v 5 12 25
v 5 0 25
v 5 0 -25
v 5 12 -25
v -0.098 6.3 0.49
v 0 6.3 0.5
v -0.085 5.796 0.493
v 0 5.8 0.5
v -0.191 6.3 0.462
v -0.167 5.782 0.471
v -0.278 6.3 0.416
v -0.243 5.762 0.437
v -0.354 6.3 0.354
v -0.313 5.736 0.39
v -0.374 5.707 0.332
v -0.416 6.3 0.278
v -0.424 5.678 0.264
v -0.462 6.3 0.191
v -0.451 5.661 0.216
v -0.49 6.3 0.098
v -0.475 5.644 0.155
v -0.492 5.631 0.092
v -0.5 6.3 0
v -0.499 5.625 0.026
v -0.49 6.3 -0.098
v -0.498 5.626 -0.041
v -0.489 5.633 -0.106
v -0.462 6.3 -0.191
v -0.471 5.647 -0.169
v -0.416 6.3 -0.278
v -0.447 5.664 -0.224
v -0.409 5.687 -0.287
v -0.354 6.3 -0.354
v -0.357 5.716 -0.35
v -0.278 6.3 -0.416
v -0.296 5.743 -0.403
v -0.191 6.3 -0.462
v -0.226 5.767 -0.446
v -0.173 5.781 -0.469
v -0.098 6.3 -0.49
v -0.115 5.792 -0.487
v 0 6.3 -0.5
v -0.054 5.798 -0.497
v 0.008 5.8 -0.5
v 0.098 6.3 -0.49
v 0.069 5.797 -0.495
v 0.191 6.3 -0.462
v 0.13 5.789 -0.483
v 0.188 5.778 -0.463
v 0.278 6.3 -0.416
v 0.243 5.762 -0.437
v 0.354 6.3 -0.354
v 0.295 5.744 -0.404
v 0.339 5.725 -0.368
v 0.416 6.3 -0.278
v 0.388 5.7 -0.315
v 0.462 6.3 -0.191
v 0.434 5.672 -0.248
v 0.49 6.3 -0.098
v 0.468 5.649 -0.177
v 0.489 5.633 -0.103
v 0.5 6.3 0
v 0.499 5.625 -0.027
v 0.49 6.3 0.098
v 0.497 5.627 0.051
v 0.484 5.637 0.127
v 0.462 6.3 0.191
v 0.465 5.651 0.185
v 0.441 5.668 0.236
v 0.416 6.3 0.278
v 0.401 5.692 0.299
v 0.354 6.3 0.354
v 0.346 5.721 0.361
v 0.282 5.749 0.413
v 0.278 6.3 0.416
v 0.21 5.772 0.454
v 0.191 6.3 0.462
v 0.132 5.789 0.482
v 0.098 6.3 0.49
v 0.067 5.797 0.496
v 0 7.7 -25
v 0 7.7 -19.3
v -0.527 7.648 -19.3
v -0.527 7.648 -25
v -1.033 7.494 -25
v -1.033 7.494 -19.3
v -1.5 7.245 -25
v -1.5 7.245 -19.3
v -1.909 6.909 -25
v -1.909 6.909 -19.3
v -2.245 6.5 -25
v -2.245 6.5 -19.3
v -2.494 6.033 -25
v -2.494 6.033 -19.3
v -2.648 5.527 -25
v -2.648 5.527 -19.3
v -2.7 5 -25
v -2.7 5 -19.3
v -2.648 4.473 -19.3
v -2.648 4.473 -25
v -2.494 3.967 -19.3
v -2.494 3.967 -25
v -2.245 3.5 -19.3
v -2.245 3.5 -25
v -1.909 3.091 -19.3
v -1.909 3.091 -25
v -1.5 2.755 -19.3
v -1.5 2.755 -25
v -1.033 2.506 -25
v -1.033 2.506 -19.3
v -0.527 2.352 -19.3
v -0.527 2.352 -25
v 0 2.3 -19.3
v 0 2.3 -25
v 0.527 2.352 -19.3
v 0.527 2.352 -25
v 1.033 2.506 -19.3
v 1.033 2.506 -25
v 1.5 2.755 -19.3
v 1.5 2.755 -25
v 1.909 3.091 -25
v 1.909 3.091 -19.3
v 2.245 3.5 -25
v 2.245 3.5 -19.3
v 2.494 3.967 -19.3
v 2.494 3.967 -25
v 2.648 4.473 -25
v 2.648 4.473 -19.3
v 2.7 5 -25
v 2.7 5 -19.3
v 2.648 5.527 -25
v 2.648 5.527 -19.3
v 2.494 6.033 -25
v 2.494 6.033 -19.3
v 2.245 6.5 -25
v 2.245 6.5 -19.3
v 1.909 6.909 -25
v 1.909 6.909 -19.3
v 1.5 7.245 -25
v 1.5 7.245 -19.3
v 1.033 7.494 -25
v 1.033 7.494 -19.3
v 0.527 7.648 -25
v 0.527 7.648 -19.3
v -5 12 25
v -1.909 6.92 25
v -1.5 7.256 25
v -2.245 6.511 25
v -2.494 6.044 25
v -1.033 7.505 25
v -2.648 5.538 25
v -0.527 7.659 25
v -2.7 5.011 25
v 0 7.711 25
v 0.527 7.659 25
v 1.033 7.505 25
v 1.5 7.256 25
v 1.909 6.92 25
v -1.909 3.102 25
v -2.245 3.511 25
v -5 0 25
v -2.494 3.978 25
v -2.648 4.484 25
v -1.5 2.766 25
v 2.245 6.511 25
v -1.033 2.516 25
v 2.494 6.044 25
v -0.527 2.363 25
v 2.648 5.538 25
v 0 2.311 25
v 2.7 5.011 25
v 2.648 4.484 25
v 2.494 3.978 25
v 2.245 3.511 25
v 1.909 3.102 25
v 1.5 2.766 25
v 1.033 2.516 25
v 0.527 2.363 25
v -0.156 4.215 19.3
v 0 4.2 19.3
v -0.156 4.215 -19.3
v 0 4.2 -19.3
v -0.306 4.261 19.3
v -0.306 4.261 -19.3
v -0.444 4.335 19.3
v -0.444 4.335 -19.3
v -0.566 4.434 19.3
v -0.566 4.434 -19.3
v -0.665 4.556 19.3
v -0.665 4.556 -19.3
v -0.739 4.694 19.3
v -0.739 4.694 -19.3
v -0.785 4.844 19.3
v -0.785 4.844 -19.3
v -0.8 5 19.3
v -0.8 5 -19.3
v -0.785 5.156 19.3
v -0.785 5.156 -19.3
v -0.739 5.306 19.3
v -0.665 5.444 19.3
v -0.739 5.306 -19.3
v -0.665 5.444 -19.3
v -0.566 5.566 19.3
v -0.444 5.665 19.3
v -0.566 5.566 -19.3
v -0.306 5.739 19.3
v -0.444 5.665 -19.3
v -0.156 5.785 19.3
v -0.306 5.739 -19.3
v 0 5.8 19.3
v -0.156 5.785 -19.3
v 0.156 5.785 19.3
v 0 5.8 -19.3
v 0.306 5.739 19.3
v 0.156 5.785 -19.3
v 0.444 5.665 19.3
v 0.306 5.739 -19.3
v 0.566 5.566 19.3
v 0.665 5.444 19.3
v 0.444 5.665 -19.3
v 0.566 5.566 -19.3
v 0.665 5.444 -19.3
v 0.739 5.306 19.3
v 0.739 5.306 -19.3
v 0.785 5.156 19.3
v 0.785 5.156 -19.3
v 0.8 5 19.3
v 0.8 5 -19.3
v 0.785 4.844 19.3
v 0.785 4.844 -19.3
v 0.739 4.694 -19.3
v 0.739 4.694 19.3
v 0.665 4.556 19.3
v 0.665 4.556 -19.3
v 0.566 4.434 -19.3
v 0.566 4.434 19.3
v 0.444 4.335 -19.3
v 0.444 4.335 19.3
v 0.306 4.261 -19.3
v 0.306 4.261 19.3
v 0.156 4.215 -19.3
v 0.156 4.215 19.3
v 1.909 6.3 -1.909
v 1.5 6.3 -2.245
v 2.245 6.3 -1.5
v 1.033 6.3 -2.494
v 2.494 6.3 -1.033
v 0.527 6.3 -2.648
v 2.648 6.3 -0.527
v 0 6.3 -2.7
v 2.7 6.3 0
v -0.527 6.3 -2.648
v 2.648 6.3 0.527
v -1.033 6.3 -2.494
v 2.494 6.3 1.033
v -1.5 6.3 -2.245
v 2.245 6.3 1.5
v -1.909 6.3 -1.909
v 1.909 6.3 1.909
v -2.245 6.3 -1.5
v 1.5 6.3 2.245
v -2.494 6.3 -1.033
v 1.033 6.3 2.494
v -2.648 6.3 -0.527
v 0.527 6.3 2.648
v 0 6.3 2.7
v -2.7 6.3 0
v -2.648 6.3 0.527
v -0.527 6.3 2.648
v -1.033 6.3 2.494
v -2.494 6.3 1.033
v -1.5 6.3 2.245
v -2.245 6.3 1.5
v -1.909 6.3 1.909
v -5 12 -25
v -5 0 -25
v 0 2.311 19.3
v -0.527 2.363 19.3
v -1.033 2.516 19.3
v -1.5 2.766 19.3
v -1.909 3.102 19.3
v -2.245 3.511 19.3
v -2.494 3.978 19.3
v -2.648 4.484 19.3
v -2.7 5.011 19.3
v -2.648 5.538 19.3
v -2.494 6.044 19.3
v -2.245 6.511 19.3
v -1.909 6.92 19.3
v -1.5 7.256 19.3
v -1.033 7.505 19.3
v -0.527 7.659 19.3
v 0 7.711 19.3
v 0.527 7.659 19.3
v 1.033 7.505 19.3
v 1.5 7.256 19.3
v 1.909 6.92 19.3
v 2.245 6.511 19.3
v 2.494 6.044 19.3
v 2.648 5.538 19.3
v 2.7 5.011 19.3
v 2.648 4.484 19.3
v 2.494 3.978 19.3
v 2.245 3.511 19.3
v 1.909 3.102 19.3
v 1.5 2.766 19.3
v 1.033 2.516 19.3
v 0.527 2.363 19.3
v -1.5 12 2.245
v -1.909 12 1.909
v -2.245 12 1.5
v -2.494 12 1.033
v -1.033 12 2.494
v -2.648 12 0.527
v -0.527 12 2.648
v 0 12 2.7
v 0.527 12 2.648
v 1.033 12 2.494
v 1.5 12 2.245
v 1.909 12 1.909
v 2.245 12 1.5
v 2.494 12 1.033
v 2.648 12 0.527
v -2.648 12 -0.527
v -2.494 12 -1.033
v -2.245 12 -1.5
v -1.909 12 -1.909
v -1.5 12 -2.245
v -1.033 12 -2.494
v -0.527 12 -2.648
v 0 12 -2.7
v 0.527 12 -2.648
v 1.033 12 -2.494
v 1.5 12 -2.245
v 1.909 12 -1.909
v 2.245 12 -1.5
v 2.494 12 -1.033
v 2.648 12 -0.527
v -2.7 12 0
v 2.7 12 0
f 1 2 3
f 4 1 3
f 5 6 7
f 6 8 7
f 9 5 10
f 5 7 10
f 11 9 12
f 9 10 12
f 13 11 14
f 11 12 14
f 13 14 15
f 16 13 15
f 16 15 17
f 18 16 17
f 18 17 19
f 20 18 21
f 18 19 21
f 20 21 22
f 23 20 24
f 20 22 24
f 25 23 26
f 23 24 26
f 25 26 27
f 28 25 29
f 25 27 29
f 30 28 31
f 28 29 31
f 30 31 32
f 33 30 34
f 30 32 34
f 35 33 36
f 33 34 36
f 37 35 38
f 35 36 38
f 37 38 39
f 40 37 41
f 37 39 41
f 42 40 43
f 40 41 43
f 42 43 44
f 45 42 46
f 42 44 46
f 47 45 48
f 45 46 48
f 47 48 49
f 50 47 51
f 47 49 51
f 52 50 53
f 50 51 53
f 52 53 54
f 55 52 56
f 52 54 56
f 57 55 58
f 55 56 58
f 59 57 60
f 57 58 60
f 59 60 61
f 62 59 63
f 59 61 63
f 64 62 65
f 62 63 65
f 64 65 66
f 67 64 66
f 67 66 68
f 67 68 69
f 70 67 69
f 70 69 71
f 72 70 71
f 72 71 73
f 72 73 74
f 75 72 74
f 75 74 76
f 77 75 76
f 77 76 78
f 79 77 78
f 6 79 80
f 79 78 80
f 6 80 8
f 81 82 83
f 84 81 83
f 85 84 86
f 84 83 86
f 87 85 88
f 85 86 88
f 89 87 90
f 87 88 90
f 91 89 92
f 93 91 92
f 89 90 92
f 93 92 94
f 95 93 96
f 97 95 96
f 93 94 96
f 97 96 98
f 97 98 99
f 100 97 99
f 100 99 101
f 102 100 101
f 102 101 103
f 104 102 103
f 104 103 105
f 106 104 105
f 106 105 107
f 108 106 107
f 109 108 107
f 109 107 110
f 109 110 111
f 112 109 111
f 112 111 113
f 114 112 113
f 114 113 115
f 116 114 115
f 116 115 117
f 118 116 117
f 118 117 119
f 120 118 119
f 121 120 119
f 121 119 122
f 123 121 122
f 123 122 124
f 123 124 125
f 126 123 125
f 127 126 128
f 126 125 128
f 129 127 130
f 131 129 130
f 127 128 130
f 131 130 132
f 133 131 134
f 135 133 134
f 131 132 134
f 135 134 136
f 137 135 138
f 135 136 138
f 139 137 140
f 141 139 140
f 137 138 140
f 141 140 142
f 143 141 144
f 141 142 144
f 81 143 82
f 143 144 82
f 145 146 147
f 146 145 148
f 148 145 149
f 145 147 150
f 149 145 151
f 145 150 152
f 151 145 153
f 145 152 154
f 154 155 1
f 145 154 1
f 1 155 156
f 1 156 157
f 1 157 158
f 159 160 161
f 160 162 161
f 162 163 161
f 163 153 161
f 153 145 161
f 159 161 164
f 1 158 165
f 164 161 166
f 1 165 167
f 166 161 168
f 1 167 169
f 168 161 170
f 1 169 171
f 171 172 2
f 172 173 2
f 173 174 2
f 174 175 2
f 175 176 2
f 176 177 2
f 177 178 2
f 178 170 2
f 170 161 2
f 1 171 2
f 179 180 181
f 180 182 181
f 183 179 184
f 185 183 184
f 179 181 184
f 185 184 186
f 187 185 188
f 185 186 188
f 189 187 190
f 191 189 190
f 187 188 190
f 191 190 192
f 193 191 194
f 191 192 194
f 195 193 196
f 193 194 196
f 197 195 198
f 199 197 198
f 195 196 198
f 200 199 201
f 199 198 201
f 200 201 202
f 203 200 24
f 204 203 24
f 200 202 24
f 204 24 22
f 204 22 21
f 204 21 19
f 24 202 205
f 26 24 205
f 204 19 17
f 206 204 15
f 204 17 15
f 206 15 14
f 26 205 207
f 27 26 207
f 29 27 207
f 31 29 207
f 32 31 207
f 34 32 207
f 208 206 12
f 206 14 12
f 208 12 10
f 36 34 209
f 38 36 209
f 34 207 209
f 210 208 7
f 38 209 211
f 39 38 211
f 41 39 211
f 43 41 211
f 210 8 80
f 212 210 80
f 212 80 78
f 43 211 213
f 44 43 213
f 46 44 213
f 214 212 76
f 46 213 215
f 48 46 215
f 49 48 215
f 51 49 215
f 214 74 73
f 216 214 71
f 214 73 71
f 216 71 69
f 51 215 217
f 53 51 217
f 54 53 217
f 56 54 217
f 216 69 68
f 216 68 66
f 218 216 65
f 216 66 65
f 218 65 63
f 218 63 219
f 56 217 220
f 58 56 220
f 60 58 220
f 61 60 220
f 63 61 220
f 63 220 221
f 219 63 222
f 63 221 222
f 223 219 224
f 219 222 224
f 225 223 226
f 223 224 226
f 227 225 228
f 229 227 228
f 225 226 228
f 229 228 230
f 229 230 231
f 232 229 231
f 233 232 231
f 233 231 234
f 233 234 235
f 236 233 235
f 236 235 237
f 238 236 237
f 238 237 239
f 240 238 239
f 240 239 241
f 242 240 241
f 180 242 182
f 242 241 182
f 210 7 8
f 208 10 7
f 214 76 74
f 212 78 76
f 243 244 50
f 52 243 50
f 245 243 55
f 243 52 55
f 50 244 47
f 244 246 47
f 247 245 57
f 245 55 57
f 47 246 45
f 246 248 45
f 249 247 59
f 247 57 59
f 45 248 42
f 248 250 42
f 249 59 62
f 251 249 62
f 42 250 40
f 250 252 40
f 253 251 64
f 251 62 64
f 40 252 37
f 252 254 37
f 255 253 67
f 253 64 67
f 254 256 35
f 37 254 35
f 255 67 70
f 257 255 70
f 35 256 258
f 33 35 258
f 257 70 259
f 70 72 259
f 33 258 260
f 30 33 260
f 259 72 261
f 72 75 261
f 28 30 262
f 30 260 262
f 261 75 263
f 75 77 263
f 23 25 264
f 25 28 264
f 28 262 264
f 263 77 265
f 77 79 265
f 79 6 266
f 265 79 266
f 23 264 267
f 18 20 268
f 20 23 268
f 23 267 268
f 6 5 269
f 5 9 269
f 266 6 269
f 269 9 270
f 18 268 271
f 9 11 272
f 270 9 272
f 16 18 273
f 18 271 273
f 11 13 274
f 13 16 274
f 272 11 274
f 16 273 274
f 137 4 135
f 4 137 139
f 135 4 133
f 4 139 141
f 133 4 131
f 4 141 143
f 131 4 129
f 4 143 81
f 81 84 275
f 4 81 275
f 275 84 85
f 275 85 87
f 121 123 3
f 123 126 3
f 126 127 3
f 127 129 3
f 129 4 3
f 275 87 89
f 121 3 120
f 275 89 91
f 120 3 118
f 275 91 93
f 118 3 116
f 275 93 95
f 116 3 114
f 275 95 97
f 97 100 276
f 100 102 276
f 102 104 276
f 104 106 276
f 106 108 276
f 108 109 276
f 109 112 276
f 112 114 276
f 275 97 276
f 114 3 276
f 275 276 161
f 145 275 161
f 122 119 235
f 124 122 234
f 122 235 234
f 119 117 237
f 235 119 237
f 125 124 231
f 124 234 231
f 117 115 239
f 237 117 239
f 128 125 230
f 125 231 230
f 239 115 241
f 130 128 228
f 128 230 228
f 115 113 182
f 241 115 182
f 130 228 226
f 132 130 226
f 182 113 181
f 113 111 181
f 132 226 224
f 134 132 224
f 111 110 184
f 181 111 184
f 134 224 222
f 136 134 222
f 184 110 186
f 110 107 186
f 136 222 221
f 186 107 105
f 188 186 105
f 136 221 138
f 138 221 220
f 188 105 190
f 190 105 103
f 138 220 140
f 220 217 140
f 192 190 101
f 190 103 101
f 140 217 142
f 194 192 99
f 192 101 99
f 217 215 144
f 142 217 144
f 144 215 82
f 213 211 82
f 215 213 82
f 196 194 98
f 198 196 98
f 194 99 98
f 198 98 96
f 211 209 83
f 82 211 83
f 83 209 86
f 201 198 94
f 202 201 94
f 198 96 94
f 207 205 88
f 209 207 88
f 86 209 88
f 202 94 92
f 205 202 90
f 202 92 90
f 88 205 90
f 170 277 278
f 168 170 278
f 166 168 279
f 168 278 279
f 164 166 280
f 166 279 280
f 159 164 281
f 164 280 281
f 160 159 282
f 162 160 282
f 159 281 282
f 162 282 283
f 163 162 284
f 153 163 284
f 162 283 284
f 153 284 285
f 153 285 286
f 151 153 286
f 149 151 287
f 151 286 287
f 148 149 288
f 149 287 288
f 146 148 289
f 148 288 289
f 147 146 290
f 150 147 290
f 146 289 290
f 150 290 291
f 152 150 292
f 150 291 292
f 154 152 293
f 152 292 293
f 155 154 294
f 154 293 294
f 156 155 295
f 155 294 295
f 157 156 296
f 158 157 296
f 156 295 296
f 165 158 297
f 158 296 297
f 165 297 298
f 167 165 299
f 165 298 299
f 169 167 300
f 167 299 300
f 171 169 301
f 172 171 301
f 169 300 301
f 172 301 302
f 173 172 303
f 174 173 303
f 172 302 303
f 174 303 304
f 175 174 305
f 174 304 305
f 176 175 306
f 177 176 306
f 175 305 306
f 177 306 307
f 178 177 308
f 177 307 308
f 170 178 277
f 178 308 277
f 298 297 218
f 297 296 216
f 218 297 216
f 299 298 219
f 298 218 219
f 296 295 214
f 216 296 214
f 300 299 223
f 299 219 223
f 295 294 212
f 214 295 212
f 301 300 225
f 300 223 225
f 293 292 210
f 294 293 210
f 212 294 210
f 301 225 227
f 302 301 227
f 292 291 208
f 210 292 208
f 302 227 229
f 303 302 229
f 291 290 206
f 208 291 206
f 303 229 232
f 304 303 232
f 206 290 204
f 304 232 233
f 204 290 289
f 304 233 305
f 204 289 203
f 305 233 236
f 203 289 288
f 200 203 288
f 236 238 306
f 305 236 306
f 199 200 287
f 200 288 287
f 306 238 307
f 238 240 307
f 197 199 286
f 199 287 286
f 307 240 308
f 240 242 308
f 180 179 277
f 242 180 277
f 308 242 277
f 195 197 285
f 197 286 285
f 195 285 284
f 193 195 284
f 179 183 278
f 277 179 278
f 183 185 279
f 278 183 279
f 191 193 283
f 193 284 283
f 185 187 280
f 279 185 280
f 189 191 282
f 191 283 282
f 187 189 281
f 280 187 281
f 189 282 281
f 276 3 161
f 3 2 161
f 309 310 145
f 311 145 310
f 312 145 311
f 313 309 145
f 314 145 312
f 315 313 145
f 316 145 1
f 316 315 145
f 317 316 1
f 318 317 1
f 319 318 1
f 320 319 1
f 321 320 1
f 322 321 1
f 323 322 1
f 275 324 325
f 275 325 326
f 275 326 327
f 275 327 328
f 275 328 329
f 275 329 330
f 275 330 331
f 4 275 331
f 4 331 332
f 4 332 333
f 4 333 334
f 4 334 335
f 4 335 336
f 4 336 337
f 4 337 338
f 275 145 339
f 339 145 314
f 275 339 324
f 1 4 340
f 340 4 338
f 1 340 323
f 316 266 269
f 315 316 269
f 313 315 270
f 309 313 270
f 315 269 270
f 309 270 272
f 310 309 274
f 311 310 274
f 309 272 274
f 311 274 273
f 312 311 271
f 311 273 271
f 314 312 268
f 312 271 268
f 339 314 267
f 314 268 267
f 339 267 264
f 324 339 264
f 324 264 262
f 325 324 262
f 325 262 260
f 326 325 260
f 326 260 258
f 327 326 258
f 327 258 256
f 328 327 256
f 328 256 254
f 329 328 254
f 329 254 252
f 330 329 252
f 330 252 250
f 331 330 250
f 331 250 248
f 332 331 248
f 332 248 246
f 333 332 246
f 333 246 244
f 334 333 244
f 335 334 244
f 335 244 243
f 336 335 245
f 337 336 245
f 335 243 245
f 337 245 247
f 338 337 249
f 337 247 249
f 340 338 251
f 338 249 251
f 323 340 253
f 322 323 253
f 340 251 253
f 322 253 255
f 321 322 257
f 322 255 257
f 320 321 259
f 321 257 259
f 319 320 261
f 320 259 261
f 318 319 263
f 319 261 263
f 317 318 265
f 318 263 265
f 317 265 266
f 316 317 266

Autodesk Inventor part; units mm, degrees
ref_plane "YZ Plane" through (0, 0, 0) normal (1, 0, 0) x (0, 1, 0)
ref_plane "XZ Plane" through (0, 0, 0) normal (0, 1, 0) x (-1, 0, 0)
ref_plane "XY Plane" through (0, 0, 0) normal (0, 0, 1) x (1, 0, 0)
sketch "Skizze1" plane through (0, 0, 0) normal (0, 1, 0) x (-1, 0, 0)
  line L0 (-5, -25) -> (5, -25)
  line L1 (5, -25) -> (5, 25)
  line L2 (5, 25) -> (-5, 25)
  line L3 (-5, 25) -> (-5, -25)
  line L4 (-5, -25) -> (5, 25) construction
  line L5 (5, -25) -> (-5, 25) construction
  point P0 (0, 0)
  dimension "d0" = 10
  dimension "d1" = 50
extrude "Extrusion1" add sketch "Skizze1" along normal blind 10
sketch "Skizze2" plane through (-5, 0, 25) normal (0, 0, 1) x (1, 0, 0)
  circle A0 centre (5, 5) radius 0.8
  point P0 (5, 0)
  dimension "d4" = 1.6
hole "Bohrung1" at (0, 5, 25) direction (0, 0, -1) diameter 1.6 end through all
sketch "Skizze3" plane through (0, 10, 0) normal (0, 1, 0) x (1, 0, 0)
  point P0 (0, 0)
sketch "Skizze4" plane through (0, 10, 0) normal (0, 1, 0) x (1, 0, 0)
  point P0 (0, 0)
sketch "Skizze5" plane through (0, 10, 0) normal (0, 1, 0) x (1, 0, 0)
  line L0 (-5, 25) -> (-5, -25) projected
  line L1 (5, -25) -> (5, 25) projected
  line L2 (-5, -25) -> (5, -25)
  line L3 (5, -25) -> (5, 25)
  line L4 (5, 25) -> (-5, 25)
  line L5 (-5, 25) -> (-5, -25)
  point P0 (0, 0)
extrude "Extrusion2" add sketch "Skizze5" along normal blind 2
sketch "Skizze6" plane through (0, 12, 0) normal (0, 1, 0) x (1, 0, 0)
  point P0 (0, 0)
hole "Bohrung2" at (0, 12, 0) direction (0, -1, 0) diameter 1 depth 6.7
sketch "Skizze7" plane through (0, 12, 0) normal (0, 1, 0) x (1, 0, 0)
  point P0 (0, 0)
hole "Bohrung3" at (0, 12, 0) direction (0, -1, 0) diameter 5.4 depth 5.7
sketch "Skizze8" plane through (-5, 0, 25) normal (0, 0, 1) x (1, 0, 0)
  circle A0 centre (5, 5.0108) radius 1.4918
  point P0 (5, 0)
hole "Bohrung4" at (0, 5.0108, 25) direction (0, 0, -1) diameter 5.4 depth 5.7
sketch "Skizze9" plane through (5, 0, -25) normal (0, 0, -1) x (-1, 0, 0)
  circle A0 centre (5, 5) radius 0.8 projected
  circle A1 centre (5, 5) radius 2.7
  point P0 (5, 0)
  dimension "d35" = 5.4
hole "Bohrung5" at (0, 5, -25) direction (0, 0, 1) diameter 5.4 depth 5.7
properties part number "T-Sensor_PT100" material "PMMA-Kunststoff"
